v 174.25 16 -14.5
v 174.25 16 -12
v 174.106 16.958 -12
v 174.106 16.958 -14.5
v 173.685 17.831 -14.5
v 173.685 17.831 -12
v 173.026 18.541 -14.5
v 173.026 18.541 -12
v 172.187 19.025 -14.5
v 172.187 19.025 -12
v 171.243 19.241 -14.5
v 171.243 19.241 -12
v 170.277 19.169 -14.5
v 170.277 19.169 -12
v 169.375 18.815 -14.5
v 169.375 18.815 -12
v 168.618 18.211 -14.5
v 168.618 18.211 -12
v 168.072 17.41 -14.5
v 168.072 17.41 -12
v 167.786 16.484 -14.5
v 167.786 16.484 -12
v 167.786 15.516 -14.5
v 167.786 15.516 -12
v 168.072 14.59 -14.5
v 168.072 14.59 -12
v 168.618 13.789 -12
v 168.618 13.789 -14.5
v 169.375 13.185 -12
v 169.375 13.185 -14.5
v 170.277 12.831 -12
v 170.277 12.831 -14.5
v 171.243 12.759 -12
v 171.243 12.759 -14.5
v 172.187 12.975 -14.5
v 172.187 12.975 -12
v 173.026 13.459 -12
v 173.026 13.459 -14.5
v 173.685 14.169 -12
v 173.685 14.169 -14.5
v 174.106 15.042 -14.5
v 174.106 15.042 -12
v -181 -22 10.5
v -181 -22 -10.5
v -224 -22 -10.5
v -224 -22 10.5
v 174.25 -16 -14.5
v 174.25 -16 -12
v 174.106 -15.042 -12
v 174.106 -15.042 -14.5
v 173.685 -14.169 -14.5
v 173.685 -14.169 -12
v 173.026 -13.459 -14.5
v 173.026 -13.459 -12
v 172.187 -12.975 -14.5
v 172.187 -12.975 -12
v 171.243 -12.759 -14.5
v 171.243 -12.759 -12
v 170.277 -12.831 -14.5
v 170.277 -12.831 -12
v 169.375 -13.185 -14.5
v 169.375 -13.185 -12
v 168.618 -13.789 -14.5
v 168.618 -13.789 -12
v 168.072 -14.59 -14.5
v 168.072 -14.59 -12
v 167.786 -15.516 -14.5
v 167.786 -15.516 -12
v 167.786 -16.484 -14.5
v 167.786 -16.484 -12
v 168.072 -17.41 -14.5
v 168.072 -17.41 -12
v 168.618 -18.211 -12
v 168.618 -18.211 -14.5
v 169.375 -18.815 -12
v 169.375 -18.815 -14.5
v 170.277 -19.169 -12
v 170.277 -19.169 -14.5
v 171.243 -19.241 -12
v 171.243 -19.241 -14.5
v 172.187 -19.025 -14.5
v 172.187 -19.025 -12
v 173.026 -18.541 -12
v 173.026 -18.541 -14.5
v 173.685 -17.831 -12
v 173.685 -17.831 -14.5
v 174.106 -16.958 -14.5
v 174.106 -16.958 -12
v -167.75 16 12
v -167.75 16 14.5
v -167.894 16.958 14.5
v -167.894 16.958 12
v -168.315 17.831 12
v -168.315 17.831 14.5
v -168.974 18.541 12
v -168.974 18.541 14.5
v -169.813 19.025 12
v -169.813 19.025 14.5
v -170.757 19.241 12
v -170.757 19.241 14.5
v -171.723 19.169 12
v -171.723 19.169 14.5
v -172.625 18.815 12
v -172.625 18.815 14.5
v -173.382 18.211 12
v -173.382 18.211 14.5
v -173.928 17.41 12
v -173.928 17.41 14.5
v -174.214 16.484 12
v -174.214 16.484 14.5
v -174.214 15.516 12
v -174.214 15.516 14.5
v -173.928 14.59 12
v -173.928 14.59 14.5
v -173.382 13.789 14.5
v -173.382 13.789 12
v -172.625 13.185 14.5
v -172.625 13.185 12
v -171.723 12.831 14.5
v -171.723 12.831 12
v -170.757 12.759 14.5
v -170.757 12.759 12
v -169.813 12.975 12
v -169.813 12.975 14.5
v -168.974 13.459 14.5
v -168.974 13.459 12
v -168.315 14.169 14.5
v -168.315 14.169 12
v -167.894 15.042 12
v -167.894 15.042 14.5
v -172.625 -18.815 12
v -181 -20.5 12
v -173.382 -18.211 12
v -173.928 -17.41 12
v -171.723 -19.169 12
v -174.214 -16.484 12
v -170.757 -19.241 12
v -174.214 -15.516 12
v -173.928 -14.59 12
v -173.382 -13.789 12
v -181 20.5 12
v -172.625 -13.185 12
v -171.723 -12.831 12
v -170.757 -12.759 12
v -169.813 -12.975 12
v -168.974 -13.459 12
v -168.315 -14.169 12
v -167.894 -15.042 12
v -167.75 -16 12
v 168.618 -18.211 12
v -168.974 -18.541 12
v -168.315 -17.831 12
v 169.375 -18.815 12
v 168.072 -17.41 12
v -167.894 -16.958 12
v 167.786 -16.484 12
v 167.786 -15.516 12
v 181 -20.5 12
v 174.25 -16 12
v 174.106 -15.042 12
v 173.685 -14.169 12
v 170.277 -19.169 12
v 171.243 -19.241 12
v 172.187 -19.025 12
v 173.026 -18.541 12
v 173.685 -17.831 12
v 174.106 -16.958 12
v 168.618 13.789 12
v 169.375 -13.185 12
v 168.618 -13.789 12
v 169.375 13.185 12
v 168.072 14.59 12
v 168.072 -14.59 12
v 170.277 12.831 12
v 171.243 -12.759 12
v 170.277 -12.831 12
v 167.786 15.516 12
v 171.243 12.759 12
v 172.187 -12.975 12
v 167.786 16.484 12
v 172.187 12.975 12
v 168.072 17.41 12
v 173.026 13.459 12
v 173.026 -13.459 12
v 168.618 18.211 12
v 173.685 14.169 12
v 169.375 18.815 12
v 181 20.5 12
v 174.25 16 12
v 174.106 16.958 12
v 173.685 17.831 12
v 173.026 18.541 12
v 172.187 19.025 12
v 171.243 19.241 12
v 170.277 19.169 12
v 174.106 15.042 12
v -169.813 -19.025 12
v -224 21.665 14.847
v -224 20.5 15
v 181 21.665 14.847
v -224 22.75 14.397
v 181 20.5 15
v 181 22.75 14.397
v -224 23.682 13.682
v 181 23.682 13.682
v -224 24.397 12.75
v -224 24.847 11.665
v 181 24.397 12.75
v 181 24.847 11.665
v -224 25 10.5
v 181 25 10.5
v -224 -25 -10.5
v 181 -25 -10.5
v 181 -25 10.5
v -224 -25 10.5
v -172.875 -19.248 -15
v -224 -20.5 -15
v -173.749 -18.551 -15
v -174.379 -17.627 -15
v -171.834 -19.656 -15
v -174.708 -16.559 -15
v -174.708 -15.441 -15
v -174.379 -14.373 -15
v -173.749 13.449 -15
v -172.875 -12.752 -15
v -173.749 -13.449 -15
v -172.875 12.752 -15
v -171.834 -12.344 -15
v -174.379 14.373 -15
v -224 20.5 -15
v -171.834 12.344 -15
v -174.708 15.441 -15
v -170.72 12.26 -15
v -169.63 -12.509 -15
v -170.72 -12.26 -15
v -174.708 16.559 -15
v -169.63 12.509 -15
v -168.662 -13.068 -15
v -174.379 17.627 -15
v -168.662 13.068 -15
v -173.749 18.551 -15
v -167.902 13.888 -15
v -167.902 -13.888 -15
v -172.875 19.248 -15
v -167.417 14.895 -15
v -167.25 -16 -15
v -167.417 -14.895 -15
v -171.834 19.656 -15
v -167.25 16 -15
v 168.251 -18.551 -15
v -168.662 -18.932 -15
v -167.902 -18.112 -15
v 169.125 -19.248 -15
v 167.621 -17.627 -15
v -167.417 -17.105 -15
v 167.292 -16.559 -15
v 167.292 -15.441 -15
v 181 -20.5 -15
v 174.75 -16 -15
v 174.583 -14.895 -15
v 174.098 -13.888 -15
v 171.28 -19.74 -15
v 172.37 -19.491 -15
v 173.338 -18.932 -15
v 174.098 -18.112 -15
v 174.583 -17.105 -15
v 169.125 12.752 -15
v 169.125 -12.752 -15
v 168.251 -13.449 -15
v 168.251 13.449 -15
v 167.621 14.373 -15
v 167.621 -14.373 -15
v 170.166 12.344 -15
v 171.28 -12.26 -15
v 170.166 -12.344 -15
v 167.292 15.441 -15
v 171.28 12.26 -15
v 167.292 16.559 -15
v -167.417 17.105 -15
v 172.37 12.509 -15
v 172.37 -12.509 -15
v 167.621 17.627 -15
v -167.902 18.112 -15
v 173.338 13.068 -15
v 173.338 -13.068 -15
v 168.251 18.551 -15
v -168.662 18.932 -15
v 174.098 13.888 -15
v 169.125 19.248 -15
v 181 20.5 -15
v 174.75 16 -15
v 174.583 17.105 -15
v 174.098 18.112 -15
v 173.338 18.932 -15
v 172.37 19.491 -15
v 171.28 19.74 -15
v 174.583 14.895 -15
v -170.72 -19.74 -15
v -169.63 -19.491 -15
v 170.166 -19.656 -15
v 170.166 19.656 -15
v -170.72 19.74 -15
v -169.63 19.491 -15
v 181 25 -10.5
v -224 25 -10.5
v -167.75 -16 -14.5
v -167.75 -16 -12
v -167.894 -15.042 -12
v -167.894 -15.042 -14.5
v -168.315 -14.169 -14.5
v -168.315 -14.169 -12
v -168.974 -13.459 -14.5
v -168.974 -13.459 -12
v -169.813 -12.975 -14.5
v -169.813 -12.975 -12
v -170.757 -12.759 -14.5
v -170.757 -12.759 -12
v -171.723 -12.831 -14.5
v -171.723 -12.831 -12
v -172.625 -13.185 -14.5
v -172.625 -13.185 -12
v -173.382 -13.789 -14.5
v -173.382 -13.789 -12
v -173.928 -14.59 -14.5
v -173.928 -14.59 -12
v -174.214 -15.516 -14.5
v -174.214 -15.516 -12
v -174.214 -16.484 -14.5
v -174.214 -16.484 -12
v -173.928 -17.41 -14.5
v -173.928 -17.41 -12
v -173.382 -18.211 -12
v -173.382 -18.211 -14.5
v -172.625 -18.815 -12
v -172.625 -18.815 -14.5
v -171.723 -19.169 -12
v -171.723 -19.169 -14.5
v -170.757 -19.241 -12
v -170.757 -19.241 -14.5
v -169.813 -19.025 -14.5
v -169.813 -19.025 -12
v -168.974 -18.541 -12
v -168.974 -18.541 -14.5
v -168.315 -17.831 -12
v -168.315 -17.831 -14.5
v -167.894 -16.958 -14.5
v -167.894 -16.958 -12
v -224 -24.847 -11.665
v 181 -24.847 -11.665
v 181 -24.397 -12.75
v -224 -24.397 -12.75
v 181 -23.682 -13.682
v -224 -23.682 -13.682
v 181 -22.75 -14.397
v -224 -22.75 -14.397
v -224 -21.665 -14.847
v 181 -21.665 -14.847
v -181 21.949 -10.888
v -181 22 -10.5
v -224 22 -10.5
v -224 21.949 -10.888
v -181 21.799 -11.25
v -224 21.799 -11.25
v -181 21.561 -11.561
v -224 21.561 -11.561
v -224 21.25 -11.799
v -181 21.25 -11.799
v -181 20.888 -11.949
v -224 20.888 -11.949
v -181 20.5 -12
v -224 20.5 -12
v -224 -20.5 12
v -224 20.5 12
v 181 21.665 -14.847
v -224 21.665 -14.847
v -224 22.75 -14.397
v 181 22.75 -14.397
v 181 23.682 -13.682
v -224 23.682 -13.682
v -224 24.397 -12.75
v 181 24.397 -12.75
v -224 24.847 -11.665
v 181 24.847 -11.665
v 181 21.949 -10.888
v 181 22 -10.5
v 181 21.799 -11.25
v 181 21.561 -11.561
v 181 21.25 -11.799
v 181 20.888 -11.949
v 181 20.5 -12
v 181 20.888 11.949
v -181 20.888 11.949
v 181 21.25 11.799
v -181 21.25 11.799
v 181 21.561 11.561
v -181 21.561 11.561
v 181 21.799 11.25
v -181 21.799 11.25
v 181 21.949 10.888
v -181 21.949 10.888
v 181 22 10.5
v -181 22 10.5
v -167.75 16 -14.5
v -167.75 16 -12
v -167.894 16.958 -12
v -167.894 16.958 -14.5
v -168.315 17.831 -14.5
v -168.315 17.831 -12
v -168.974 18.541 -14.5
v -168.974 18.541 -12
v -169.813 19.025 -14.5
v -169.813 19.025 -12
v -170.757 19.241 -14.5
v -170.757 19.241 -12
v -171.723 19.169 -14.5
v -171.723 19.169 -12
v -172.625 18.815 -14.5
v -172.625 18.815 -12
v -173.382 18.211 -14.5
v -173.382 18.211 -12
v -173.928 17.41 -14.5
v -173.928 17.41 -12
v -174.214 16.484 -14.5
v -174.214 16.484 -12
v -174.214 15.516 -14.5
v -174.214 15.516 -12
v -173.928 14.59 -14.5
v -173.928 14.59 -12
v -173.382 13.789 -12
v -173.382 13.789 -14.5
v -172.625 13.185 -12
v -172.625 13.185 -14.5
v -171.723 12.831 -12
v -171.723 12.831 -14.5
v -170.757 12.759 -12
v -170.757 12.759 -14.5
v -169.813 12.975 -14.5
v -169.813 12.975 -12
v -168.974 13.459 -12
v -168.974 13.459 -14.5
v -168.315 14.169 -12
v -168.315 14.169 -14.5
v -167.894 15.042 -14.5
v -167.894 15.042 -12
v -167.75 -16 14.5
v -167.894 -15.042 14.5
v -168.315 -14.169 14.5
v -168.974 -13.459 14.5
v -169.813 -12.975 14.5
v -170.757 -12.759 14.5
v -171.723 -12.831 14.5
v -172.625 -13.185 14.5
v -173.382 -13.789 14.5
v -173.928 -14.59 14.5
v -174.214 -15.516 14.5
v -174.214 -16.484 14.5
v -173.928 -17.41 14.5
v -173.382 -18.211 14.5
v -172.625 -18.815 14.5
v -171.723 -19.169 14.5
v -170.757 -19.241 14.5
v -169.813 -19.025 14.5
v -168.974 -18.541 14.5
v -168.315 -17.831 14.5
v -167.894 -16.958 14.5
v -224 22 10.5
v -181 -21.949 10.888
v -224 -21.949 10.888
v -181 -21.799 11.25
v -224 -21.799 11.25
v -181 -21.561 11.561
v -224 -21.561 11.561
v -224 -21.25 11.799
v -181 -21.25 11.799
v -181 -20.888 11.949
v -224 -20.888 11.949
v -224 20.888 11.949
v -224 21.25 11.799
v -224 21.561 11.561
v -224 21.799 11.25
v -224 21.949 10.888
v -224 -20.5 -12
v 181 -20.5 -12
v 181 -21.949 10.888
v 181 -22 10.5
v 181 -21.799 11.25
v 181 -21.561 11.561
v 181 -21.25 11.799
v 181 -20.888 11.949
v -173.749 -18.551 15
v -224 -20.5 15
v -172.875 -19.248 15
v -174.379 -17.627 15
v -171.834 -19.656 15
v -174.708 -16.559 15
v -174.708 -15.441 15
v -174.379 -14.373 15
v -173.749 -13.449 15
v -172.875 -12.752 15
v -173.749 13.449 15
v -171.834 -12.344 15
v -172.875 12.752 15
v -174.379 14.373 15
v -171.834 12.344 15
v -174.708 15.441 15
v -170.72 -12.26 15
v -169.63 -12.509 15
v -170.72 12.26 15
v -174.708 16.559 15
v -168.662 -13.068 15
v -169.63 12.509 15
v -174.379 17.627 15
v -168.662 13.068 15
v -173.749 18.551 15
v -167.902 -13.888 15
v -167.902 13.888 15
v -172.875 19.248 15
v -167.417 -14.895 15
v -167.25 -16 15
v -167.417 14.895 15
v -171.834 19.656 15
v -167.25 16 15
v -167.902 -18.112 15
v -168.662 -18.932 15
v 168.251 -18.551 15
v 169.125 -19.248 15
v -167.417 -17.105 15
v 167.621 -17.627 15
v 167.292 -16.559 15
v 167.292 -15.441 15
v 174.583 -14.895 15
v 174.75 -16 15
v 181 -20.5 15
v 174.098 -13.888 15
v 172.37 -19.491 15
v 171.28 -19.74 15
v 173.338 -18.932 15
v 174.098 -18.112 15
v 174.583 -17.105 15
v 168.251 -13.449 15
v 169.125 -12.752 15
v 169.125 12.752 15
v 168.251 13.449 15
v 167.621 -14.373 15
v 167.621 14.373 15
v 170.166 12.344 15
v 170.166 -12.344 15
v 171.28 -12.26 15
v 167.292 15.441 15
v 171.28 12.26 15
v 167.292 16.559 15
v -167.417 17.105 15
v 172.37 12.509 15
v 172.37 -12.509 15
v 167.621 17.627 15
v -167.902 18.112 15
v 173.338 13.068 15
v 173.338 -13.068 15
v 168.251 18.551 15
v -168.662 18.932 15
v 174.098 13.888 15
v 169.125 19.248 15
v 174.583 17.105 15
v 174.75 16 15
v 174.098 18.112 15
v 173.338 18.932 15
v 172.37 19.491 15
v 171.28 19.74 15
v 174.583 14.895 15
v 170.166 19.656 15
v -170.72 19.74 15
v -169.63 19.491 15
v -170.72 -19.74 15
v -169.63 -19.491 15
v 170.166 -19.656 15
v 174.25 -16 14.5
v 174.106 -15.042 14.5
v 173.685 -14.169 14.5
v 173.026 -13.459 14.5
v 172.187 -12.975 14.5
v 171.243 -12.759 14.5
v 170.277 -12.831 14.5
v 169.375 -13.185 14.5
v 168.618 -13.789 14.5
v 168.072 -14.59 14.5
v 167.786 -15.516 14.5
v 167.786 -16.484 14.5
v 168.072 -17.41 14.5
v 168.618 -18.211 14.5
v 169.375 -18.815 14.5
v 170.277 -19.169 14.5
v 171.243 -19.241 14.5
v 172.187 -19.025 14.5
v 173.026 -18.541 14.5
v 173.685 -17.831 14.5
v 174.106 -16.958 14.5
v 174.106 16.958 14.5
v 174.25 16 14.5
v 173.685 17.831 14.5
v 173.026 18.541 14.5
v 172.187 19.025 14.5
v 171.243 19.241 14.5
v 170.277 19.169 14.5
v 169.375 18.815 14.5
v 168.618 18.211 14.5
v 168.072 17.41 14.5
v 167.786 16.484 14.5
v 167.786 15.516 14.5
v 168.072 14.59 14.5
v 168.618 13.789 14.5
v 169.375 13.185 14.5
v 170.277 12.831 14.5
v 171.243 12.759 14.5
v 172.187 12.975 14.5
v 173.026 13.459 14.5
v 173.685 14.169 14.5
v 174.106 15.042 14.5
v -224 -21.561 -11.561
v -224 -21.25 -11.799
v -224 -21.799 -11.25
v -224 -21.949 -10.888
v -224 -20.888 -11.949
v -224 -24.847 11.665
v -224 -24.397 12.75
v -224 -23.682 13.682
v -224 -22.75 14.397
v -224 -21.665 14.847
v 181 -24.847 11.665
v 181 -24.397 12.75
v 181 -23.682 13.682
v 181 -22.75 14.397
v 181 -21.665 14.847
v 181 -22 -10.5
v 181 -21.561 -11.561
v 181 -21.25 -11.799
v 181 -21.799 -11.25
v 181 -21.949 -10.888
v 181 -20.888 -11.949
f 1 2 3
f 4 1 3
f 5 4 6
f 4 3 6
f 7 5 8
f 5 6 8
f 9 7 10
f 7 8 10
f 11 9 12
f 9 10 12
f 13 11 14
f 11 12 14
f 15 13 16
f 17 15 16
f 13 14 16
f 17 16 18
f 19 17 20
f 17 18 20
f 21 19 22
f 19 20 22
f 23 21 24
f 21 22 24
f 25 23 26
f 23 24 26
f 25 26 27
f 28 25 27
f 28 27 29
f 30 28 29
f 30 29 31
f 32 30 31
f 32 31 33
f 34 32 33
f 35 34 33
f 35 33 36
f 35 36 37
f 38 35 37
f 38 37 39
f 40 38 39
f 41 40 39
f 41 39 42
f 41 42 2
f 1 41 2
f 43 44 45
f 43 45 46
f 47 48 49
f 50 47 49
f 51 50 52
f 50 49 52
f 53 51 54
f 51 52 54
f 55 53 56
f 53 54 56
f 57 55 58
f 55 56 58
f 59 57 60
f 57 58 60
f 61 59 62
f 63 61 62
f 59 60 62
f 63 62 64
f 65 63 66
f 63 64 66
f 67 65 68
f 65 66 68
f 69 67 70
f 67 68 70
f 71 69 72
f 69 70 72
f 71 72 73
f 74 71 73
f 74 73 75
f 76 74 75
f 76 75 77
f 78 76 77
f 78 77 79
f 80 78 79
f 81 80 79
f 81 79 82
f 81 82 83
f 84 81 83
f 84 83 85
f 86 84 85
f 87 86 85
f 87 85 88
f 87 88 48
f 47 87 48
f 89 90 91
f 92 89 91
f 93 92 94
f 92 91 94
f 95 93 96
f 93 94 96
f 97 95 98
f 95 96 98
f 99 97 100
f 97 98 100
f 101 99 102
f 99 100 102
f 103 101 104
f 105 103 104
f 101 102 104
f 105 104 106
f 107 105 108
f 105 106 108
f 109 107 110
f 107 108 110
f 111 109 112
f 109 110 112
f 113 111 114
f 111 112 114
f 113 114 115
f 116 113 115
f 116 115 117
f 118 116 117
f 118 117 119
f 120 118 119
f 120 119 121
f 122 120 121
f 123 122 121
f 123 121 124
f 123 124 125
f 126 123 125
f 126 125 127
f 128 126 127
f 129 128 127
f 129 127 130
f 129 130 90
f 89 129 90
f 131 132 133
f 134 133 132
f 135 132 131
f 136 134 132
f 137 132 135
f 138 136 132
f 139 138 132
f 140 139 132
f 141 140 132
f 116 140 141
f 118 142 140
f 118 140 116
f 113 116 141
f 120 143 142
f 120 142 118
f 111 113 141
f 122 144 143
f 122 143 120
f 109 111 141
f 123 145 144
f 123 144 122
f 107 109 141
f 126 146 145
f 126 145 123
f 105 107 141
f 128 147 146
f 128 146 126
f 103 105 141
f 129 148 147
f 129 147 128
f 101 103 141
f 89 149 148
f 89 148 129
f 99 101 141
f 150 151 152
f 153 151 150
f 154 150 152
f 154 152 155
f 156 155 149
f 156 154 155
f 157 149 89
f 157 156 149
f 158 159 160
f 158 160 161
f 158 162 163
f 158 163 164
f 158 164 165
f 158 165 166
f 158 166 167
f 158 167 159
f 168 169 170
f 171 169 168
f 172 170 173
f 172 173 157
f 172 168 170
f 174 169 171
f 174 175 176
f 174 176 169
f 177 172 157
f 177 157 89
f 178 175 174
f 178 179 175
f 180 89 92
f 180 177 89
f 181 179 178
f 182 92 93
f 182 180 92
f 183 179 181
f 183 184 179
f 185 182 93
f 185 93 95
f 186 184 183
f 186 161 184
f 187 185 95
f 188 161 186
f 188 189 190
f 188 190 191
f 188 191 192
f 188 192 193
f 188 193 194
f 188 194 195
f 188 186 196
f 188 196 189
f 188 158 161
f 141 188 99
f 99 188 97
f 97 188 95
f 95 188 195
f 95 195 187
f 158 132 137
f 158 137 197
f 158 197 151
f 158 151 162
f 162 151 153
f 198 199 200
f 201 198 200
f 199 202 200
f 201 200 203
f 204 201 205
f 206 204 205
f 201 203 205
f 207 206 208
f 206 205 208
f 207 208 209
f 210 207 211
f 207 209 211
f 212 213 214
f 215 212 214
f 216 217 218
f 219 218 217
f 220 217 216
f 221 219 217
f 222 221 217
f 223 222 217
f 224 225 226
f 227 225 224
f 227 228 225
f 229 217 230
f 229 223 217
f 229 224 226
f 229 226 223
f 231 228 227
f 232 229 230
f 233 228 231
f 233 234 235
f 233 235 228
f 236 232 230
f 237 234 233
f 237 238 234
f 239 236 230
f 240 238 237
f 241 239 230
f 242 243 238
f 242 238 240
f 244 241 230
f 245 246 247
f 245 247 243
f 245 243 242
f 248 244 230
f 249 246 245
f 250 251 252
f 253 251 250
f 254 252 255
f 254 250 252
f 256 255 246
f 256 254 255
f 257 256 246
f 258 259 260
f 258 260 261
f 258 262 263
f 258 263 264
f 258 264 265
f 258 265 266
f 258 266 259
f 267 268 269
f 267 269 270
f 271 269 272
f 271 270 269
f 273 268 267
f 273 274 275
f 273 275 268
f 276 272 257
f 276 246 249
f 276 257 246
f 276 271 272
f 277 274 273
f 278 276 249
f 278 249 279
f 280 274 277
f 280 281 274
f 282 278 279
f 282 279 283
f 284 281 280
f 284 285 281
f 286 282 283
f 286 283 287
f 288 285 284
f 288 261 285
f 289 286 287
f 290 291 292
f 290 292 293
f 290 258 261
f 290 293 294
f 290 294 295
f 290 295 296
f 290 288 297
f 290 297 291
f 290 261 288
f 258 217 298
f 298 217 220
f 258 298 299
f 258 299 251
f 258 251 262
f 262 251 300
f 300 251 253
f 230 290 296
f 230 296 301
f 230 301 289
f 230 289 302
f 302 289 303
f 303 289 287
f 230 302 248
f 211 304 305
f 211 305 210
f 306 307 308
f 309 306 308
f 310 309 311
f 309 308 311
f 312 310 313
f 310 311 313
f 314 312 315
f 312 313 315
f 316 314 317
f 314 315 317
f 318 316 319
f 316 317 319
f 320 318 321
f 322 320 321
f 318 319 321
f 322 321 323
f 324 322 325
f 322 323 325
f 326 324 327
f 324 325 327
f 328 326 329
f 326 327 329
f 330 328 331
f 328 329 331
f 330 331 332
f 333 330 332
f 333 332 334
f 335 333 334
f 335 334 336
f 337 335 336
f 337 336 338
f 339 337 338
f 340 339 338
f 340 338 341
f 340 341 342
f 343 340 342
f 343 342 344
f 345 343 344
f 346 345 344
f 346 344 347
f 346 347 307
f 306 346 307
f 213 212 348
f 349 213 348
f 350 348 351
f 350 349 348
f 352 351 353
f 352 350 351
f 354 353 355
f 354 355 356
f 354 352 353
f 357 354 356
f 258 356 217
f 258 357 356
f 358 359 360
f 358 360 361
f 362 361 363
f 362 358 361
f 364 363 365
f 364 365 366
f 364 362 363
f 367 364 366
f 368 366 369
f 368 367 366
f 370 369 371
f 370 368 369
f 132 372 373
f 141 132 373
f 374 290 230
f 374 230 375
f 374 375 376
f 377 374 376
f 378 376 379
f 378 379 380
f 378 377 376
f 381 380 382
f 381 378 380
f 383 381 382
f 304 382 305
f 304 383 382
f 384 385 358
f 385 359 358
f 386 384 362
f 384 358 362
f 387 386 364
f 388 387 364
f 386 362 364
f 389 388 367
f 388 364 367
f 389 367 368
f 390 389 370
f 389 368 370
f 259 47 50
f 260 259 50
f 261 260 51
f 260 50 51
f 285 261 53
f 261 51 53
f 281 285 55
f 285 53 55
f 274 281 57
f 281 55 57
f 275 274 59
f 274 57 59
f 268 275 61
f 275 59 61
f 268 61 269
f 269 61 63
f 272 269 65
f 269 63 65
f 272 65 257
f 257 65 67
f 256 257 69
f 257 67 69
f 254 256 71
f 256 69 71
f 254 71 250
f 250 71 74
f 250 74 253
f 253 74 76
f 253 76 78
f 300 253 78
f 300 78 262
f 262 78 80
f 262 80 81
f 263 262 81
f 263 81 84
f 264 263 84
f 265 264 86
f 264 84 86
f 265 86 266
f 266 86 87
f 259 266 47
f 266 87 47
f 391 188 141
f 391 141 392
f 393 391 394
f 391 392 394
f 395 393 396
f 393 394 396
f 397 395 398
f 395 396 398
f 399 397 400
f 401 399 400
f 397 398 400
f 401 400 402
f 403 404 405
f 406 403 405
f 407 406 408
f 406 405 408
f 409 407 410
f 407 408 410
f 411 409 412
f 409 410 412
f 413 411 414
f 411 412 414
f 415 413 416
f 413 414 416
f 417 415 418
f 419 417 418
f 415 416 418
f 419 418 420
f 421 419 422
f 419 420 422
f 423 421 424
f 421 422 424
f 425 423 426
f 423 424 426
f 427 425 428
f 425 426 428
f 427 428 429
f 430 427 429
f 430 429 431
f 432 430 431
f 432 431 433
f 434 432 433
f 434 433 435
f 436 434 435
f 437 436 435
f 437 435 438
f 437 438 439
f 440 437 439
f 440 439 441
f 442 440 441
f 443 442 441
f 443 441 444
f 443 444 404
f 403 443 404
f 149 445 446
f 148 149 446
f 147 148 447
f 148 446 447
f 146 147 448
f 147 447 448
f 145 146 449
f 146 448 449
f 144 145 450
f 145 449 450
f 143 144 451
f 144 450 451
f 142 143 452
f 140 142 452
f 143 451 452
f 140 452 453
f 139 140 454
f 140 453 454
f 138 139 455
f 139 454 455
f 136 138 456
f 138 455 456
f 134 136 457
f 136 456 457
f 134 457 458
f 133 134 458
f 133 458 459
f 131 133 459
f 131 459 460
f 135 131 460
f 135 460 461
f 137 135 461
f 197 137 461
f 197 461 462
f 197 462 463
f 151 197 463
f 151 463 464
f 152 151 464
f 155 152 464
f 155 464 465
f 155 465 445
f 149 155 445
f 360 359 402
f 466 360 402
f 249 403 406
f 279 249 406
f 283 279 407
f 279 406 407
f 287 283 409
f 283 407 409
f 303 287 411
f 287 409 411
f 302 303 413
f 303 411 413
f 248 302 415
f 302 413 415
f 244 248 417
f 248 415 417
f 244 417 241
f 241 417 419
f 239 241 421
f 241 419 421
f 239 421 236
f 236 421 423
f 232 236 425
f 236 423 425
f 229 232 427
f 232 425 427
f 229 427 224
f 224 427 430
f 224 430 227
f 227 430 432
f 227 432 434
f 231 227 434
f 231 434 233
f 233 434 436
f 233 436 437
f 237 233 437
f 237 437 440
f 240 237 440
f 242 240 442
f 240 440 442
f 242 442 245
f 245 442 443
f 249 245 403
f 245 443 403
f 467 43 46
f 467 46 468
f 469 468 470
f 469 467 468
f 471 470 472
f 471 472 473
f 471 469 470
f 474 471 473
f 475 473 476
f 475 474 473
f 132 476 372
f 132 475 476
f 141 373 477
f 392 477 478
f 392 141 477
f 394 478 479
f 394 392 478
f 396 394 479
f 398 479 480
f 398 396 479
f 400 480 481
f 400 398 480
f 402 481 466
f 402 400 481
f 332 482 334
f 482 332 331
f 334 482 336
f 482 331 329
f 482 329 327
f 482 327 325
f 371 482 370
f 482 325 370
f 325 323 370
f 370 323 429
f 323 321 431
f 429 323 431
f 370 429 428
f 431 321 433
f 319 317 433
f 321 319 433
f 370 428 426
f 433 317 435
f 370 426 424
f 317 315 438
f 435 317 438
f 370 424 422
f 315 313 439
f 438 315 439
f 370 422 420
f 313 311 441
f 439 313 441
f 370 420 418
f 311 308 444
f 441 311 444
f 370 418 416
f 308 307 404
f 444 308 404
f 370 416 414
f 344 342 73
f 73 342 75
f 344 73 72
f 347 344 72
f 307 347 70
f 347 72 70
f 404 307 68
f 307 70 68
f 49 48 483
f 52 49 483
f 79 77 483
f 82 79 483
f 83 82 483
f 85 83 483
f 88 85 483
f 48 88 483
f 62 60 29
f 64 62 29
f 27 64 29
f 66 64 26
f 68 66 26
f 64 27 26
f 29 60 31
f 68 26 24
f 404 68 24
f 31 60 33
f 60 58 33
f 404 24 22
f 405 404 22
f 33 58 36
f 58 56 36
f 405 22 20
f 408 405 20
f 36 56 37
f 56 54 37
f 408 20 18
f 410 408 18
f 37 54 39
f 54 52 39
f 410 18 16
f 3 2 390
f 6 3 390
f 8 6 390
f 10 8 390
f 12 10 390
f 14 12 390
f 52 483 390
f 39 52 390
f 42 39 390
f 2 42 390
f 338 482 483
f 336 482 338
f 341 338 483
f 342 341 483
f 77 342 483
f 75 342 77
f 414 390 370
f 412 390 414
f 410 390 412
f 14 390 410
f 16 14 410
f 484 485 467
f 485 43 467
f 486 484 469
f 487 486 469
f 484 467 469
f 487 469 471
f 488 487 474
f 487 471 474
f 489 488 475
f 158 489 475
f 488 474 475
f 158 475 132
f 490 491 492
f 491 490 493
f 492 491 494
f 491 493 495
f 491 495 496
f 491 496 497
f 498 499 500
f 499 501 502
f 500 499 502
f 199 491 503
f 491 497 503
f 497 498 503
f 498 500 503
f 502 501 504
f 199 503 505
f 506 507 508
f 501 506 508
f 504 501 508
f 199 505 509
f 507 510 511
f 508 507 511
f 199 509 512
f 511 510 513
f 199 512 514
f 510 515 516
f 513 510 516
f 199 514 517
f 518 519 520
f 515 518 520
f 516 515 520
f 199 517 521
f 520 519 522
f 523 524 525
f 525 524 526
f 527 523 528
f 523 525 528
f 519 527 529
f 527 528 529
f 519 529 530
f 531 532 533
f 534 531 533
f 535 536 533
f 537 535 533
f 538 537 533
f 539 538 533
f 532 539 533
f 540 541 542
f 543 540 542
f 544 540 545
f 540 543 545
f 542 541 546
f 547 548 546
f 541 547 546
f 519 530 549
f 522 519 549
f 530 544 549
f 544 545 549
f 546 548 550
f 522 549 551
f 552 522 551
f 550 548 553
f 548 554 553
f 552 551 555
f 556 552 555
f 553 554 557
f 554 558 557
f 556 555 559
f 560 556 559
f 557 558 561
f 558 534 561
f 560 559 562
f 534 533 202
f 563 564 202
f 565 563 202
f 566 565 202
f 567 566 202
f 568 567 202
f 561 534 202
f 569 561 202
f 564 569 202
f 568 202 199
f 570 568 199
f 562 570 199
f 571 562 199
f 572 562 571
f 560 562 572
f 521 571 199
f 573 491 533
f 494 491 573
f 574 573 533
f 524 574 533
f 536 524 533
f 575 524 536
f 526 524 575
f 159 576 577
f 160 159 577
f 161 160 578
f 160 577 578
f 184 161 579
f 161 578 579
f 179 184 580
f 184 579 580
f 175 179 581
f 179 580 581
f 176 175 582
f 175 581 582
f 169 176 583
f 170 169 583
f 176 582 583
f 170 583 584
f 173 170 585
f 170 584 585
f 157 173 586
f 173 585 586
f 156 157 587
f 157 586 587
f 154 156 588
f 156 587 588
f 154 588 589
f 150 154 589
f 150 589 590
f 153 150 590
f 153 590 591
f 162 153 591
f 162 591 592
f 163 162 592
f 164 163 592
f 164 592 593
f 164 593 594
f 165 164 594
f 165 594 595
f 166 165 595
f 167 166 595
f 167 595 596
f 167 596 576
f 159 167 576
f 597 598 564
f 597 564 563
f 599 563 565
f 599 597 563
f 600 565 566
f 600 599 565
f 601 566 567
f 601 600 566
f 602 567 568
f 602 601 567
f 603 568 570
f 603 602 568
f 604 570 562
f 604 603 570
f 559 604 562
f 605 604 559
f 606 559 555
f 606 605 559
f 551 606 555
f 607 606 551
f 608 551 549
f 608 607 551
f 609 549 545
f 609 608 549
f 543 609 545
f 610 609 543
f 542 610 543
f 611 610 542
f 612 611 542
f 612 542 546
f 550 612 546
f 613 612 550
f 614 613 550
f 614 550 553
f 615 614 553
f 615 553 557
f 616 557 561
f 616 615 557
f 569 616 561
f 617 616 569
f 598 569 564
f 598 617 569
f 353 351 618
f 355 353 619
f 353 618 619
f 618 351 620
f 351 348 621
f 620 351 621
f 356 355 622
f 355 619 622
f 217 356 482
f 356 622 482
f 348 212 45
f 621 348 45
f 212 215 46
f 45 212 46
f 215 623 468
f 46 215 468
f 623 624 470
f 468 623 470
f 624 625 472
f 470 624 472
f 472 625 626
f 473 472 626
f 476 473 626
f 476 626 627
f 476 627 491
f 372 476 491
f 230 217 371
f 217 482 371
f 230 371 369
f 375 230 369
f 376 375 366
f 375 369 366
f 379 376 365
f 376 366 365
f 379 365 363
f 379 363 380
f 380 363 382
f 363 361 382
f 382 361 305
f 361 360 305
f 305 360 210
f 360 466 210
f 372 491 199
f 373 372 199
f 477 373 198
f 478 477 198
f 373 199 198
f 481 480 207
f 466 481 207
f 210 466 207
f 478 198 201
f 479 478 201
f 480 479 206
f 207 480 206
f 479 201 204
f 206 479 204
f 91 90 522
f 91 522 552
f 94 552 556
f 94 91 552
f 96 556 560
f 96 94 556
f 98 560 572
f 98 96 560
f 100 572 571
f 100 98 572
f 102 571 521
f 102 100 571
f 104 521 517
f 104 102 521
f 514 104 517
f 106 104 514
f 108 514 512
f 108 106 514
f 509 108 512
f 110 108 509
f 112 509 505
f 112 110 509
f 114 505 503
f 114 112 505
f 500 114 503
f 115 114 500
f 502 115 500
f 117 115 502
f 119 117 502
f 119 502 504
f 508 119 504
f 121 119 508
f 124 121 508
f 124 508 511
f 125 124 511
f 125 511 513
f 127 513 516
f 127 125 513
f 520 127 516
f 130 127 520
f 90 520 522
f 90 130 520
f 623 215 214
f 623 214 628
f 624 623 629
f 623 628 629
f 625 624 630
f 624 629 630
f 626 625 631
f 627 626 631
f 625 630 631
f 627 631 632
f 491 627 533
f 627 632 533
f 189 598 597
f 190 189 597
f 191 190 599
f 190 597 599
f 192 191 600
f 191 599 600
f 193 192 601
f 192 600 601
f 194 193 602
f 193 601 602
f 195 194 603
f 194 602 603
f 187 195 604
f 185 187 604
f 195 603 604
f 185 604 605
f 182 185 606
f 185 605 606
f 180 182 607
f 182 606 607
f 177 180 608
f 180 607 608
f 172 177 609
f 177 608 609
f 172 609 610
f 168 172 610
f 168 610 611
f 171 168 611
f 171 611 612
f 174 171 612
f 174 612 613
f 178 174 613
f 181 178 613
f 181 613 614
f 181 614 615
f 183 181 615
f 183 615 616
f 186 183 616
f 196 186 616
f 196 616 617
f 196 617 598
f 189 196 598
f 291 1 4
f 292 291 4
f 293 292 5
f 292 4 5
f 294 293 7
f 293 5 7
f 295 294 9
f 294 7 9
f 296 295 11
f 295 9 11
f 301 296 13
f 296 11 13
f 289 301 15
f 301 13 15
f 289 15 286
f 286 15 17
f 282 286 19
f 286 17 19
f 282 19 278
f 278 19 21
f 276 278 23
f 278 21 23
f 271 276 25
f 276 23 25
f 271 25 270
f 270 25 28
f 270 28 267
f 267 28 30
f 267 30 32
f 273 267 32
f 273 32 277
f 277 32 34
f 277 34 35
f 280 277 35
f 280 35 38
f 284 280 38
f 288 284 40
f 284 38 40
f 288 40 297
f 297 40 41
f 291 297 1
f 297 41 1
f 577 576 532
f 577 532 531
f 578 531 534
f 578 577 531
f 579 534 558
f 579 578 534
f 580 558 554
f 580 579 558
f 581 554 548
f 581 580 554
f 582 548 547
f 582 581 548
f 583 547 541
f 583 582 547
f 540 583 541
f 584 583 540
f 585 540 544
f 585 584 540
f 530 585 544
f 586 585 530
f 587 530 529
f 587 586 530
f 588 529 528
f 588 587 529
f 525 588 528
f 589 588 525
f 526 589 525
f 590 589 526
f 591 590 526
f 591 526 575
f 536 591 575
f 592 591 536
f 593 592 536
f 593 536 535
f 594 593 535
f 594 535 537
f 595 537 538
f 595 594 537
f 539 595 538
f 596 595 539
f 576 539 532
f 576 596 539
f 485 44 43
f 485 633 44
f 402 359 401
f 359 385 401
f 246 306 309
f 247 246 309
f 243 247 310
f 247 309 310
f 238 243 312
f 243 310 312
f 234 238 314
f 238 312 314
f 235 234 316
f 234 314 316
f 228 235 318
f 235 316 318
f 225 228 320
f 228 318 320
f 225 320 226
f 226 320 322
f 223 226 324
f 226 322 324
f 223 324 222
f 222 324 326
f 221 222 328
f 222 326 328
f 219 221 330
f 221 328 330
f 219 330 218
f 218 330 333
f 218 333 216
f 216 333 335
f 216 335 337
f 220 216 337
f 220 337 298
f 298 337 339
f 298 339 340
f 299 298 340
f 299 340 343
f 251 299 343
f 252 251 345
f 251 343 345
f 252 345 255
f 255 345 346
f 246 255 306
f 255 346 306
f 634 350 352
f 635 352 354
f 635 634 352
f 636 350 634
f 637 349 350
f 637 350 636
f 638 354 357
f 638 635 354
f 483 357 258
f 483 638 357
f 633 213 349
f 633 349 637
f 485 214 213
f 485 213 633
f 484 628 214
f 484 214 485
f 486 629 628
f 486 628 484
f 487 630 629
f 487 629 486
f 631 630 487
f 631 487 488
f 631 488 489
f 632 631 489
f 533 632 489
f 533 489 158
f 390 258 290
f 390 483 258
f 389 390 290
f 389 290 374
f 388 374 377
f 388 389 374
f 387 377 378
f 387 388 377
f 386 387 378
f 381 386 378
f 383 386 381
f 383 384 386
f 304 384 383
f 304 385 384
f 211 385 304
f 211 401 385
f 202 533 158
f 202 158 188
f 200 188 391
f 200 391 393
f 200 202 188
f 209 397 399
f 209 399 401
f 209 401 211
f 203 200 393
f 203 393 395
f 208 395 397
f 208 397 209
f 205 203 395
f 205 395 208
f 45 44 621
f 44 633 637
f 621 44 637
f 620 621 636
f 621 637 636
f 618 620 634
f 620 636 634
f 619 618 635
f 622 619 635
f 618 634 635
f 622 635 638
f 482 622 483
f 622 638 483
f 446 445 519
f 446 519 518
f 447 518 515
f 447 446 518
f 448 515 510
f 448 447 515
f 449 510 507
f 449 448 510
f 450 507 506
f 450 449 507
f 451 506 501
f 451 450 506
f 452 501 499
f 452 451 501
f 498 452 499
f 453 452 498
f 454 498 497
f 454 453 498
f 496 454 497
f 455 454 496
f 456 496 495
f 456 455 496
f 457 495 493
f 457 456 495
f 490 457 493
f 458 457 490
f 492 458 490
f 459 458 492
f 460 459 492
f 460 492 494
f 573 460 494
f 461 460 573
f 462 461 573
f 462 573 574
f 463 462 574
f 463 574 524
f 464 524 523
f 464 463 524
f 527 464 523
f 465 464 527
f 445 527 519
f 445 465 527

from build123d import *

# Parameters (mm, degrees)
F0_W     = 50
F0_H     = 30
F0_W_2   = 44
F0_H_2   = 24
F1_DEPTH = 181
F2_R     = 1.5
F3_R     = 4.5
F4_R     = 3.25
F5_DEPTH = 35
F6_SIZE  = 0.5
F7_DEPTH = 43


with BuildPart() as f1:
    # F0 (on Right) → F1 (new body, symmetric)
    with BuildSketch(Plane.YZ):
        Rectangle(F0_W, F0_H)
        Rectangle(F0_W_2, F0_H_2, mode=Mode.SUBTRACT)
    extrude(amount=F1_DEPTH, both=True)

    # F2
    f2_edges = [f1.edges().sort_by_distance(p)[0] for p in [
        (0, -22, -12),
        (0, -22, 12),
        (0, 22, -12),
        (0, 22, 12),
    ]]
    fillet(f2_edges, radius=F2_R)

    # F3
    f3_edges = [f1.edges().sort_by_distance(p)[0] for p in [
        (0, -25, 15),
        (0, -25, -15),
        (0, 25, -15),
        (0, 25, 15),
    ]]
    fillet(f3_edges, radius=F3_R)

    # F4 (on face) → F5 (cut)
    with BuildSketch(Plane.XY.offset(15)):
        with Locations((-171, 16)):
            Circle(F4_R)
        with Locations((-171, -16)):
            Circle(F4_R)
        with Locations((171, -16)):
            Circle(F4_R)
        with Locations((171, 16)):
            Circle(F4_R)
    extrude(amount=-F5_DEPTH, mode=Mode.SUBTRACT)

    # F6
    f6_edges = [f1.edges().sort_by_distance(p)[0] for p in [
        (-174.25, -16, 15),
        (-174.25, 16, 15),
        (167.75, -16, 15),
        (167.75, 16, 15),
        (167.75, 16, -15),
        (167.75, -16, -15),
        (-174.25, 16, -15),
        (-174.25, -16, -15),
    ]]
    chamfer(f6_edges, length=F6_SIZE)

    # F7 (add): a face of the model
    f7_faces = [f1.faces().sort_by_distance(p)[0] for p in [
        (-181, -24.4169048105, 0),
    ]]
    extrude(f7_faces, amount=F7_DEPTH)


solid = f1.part
